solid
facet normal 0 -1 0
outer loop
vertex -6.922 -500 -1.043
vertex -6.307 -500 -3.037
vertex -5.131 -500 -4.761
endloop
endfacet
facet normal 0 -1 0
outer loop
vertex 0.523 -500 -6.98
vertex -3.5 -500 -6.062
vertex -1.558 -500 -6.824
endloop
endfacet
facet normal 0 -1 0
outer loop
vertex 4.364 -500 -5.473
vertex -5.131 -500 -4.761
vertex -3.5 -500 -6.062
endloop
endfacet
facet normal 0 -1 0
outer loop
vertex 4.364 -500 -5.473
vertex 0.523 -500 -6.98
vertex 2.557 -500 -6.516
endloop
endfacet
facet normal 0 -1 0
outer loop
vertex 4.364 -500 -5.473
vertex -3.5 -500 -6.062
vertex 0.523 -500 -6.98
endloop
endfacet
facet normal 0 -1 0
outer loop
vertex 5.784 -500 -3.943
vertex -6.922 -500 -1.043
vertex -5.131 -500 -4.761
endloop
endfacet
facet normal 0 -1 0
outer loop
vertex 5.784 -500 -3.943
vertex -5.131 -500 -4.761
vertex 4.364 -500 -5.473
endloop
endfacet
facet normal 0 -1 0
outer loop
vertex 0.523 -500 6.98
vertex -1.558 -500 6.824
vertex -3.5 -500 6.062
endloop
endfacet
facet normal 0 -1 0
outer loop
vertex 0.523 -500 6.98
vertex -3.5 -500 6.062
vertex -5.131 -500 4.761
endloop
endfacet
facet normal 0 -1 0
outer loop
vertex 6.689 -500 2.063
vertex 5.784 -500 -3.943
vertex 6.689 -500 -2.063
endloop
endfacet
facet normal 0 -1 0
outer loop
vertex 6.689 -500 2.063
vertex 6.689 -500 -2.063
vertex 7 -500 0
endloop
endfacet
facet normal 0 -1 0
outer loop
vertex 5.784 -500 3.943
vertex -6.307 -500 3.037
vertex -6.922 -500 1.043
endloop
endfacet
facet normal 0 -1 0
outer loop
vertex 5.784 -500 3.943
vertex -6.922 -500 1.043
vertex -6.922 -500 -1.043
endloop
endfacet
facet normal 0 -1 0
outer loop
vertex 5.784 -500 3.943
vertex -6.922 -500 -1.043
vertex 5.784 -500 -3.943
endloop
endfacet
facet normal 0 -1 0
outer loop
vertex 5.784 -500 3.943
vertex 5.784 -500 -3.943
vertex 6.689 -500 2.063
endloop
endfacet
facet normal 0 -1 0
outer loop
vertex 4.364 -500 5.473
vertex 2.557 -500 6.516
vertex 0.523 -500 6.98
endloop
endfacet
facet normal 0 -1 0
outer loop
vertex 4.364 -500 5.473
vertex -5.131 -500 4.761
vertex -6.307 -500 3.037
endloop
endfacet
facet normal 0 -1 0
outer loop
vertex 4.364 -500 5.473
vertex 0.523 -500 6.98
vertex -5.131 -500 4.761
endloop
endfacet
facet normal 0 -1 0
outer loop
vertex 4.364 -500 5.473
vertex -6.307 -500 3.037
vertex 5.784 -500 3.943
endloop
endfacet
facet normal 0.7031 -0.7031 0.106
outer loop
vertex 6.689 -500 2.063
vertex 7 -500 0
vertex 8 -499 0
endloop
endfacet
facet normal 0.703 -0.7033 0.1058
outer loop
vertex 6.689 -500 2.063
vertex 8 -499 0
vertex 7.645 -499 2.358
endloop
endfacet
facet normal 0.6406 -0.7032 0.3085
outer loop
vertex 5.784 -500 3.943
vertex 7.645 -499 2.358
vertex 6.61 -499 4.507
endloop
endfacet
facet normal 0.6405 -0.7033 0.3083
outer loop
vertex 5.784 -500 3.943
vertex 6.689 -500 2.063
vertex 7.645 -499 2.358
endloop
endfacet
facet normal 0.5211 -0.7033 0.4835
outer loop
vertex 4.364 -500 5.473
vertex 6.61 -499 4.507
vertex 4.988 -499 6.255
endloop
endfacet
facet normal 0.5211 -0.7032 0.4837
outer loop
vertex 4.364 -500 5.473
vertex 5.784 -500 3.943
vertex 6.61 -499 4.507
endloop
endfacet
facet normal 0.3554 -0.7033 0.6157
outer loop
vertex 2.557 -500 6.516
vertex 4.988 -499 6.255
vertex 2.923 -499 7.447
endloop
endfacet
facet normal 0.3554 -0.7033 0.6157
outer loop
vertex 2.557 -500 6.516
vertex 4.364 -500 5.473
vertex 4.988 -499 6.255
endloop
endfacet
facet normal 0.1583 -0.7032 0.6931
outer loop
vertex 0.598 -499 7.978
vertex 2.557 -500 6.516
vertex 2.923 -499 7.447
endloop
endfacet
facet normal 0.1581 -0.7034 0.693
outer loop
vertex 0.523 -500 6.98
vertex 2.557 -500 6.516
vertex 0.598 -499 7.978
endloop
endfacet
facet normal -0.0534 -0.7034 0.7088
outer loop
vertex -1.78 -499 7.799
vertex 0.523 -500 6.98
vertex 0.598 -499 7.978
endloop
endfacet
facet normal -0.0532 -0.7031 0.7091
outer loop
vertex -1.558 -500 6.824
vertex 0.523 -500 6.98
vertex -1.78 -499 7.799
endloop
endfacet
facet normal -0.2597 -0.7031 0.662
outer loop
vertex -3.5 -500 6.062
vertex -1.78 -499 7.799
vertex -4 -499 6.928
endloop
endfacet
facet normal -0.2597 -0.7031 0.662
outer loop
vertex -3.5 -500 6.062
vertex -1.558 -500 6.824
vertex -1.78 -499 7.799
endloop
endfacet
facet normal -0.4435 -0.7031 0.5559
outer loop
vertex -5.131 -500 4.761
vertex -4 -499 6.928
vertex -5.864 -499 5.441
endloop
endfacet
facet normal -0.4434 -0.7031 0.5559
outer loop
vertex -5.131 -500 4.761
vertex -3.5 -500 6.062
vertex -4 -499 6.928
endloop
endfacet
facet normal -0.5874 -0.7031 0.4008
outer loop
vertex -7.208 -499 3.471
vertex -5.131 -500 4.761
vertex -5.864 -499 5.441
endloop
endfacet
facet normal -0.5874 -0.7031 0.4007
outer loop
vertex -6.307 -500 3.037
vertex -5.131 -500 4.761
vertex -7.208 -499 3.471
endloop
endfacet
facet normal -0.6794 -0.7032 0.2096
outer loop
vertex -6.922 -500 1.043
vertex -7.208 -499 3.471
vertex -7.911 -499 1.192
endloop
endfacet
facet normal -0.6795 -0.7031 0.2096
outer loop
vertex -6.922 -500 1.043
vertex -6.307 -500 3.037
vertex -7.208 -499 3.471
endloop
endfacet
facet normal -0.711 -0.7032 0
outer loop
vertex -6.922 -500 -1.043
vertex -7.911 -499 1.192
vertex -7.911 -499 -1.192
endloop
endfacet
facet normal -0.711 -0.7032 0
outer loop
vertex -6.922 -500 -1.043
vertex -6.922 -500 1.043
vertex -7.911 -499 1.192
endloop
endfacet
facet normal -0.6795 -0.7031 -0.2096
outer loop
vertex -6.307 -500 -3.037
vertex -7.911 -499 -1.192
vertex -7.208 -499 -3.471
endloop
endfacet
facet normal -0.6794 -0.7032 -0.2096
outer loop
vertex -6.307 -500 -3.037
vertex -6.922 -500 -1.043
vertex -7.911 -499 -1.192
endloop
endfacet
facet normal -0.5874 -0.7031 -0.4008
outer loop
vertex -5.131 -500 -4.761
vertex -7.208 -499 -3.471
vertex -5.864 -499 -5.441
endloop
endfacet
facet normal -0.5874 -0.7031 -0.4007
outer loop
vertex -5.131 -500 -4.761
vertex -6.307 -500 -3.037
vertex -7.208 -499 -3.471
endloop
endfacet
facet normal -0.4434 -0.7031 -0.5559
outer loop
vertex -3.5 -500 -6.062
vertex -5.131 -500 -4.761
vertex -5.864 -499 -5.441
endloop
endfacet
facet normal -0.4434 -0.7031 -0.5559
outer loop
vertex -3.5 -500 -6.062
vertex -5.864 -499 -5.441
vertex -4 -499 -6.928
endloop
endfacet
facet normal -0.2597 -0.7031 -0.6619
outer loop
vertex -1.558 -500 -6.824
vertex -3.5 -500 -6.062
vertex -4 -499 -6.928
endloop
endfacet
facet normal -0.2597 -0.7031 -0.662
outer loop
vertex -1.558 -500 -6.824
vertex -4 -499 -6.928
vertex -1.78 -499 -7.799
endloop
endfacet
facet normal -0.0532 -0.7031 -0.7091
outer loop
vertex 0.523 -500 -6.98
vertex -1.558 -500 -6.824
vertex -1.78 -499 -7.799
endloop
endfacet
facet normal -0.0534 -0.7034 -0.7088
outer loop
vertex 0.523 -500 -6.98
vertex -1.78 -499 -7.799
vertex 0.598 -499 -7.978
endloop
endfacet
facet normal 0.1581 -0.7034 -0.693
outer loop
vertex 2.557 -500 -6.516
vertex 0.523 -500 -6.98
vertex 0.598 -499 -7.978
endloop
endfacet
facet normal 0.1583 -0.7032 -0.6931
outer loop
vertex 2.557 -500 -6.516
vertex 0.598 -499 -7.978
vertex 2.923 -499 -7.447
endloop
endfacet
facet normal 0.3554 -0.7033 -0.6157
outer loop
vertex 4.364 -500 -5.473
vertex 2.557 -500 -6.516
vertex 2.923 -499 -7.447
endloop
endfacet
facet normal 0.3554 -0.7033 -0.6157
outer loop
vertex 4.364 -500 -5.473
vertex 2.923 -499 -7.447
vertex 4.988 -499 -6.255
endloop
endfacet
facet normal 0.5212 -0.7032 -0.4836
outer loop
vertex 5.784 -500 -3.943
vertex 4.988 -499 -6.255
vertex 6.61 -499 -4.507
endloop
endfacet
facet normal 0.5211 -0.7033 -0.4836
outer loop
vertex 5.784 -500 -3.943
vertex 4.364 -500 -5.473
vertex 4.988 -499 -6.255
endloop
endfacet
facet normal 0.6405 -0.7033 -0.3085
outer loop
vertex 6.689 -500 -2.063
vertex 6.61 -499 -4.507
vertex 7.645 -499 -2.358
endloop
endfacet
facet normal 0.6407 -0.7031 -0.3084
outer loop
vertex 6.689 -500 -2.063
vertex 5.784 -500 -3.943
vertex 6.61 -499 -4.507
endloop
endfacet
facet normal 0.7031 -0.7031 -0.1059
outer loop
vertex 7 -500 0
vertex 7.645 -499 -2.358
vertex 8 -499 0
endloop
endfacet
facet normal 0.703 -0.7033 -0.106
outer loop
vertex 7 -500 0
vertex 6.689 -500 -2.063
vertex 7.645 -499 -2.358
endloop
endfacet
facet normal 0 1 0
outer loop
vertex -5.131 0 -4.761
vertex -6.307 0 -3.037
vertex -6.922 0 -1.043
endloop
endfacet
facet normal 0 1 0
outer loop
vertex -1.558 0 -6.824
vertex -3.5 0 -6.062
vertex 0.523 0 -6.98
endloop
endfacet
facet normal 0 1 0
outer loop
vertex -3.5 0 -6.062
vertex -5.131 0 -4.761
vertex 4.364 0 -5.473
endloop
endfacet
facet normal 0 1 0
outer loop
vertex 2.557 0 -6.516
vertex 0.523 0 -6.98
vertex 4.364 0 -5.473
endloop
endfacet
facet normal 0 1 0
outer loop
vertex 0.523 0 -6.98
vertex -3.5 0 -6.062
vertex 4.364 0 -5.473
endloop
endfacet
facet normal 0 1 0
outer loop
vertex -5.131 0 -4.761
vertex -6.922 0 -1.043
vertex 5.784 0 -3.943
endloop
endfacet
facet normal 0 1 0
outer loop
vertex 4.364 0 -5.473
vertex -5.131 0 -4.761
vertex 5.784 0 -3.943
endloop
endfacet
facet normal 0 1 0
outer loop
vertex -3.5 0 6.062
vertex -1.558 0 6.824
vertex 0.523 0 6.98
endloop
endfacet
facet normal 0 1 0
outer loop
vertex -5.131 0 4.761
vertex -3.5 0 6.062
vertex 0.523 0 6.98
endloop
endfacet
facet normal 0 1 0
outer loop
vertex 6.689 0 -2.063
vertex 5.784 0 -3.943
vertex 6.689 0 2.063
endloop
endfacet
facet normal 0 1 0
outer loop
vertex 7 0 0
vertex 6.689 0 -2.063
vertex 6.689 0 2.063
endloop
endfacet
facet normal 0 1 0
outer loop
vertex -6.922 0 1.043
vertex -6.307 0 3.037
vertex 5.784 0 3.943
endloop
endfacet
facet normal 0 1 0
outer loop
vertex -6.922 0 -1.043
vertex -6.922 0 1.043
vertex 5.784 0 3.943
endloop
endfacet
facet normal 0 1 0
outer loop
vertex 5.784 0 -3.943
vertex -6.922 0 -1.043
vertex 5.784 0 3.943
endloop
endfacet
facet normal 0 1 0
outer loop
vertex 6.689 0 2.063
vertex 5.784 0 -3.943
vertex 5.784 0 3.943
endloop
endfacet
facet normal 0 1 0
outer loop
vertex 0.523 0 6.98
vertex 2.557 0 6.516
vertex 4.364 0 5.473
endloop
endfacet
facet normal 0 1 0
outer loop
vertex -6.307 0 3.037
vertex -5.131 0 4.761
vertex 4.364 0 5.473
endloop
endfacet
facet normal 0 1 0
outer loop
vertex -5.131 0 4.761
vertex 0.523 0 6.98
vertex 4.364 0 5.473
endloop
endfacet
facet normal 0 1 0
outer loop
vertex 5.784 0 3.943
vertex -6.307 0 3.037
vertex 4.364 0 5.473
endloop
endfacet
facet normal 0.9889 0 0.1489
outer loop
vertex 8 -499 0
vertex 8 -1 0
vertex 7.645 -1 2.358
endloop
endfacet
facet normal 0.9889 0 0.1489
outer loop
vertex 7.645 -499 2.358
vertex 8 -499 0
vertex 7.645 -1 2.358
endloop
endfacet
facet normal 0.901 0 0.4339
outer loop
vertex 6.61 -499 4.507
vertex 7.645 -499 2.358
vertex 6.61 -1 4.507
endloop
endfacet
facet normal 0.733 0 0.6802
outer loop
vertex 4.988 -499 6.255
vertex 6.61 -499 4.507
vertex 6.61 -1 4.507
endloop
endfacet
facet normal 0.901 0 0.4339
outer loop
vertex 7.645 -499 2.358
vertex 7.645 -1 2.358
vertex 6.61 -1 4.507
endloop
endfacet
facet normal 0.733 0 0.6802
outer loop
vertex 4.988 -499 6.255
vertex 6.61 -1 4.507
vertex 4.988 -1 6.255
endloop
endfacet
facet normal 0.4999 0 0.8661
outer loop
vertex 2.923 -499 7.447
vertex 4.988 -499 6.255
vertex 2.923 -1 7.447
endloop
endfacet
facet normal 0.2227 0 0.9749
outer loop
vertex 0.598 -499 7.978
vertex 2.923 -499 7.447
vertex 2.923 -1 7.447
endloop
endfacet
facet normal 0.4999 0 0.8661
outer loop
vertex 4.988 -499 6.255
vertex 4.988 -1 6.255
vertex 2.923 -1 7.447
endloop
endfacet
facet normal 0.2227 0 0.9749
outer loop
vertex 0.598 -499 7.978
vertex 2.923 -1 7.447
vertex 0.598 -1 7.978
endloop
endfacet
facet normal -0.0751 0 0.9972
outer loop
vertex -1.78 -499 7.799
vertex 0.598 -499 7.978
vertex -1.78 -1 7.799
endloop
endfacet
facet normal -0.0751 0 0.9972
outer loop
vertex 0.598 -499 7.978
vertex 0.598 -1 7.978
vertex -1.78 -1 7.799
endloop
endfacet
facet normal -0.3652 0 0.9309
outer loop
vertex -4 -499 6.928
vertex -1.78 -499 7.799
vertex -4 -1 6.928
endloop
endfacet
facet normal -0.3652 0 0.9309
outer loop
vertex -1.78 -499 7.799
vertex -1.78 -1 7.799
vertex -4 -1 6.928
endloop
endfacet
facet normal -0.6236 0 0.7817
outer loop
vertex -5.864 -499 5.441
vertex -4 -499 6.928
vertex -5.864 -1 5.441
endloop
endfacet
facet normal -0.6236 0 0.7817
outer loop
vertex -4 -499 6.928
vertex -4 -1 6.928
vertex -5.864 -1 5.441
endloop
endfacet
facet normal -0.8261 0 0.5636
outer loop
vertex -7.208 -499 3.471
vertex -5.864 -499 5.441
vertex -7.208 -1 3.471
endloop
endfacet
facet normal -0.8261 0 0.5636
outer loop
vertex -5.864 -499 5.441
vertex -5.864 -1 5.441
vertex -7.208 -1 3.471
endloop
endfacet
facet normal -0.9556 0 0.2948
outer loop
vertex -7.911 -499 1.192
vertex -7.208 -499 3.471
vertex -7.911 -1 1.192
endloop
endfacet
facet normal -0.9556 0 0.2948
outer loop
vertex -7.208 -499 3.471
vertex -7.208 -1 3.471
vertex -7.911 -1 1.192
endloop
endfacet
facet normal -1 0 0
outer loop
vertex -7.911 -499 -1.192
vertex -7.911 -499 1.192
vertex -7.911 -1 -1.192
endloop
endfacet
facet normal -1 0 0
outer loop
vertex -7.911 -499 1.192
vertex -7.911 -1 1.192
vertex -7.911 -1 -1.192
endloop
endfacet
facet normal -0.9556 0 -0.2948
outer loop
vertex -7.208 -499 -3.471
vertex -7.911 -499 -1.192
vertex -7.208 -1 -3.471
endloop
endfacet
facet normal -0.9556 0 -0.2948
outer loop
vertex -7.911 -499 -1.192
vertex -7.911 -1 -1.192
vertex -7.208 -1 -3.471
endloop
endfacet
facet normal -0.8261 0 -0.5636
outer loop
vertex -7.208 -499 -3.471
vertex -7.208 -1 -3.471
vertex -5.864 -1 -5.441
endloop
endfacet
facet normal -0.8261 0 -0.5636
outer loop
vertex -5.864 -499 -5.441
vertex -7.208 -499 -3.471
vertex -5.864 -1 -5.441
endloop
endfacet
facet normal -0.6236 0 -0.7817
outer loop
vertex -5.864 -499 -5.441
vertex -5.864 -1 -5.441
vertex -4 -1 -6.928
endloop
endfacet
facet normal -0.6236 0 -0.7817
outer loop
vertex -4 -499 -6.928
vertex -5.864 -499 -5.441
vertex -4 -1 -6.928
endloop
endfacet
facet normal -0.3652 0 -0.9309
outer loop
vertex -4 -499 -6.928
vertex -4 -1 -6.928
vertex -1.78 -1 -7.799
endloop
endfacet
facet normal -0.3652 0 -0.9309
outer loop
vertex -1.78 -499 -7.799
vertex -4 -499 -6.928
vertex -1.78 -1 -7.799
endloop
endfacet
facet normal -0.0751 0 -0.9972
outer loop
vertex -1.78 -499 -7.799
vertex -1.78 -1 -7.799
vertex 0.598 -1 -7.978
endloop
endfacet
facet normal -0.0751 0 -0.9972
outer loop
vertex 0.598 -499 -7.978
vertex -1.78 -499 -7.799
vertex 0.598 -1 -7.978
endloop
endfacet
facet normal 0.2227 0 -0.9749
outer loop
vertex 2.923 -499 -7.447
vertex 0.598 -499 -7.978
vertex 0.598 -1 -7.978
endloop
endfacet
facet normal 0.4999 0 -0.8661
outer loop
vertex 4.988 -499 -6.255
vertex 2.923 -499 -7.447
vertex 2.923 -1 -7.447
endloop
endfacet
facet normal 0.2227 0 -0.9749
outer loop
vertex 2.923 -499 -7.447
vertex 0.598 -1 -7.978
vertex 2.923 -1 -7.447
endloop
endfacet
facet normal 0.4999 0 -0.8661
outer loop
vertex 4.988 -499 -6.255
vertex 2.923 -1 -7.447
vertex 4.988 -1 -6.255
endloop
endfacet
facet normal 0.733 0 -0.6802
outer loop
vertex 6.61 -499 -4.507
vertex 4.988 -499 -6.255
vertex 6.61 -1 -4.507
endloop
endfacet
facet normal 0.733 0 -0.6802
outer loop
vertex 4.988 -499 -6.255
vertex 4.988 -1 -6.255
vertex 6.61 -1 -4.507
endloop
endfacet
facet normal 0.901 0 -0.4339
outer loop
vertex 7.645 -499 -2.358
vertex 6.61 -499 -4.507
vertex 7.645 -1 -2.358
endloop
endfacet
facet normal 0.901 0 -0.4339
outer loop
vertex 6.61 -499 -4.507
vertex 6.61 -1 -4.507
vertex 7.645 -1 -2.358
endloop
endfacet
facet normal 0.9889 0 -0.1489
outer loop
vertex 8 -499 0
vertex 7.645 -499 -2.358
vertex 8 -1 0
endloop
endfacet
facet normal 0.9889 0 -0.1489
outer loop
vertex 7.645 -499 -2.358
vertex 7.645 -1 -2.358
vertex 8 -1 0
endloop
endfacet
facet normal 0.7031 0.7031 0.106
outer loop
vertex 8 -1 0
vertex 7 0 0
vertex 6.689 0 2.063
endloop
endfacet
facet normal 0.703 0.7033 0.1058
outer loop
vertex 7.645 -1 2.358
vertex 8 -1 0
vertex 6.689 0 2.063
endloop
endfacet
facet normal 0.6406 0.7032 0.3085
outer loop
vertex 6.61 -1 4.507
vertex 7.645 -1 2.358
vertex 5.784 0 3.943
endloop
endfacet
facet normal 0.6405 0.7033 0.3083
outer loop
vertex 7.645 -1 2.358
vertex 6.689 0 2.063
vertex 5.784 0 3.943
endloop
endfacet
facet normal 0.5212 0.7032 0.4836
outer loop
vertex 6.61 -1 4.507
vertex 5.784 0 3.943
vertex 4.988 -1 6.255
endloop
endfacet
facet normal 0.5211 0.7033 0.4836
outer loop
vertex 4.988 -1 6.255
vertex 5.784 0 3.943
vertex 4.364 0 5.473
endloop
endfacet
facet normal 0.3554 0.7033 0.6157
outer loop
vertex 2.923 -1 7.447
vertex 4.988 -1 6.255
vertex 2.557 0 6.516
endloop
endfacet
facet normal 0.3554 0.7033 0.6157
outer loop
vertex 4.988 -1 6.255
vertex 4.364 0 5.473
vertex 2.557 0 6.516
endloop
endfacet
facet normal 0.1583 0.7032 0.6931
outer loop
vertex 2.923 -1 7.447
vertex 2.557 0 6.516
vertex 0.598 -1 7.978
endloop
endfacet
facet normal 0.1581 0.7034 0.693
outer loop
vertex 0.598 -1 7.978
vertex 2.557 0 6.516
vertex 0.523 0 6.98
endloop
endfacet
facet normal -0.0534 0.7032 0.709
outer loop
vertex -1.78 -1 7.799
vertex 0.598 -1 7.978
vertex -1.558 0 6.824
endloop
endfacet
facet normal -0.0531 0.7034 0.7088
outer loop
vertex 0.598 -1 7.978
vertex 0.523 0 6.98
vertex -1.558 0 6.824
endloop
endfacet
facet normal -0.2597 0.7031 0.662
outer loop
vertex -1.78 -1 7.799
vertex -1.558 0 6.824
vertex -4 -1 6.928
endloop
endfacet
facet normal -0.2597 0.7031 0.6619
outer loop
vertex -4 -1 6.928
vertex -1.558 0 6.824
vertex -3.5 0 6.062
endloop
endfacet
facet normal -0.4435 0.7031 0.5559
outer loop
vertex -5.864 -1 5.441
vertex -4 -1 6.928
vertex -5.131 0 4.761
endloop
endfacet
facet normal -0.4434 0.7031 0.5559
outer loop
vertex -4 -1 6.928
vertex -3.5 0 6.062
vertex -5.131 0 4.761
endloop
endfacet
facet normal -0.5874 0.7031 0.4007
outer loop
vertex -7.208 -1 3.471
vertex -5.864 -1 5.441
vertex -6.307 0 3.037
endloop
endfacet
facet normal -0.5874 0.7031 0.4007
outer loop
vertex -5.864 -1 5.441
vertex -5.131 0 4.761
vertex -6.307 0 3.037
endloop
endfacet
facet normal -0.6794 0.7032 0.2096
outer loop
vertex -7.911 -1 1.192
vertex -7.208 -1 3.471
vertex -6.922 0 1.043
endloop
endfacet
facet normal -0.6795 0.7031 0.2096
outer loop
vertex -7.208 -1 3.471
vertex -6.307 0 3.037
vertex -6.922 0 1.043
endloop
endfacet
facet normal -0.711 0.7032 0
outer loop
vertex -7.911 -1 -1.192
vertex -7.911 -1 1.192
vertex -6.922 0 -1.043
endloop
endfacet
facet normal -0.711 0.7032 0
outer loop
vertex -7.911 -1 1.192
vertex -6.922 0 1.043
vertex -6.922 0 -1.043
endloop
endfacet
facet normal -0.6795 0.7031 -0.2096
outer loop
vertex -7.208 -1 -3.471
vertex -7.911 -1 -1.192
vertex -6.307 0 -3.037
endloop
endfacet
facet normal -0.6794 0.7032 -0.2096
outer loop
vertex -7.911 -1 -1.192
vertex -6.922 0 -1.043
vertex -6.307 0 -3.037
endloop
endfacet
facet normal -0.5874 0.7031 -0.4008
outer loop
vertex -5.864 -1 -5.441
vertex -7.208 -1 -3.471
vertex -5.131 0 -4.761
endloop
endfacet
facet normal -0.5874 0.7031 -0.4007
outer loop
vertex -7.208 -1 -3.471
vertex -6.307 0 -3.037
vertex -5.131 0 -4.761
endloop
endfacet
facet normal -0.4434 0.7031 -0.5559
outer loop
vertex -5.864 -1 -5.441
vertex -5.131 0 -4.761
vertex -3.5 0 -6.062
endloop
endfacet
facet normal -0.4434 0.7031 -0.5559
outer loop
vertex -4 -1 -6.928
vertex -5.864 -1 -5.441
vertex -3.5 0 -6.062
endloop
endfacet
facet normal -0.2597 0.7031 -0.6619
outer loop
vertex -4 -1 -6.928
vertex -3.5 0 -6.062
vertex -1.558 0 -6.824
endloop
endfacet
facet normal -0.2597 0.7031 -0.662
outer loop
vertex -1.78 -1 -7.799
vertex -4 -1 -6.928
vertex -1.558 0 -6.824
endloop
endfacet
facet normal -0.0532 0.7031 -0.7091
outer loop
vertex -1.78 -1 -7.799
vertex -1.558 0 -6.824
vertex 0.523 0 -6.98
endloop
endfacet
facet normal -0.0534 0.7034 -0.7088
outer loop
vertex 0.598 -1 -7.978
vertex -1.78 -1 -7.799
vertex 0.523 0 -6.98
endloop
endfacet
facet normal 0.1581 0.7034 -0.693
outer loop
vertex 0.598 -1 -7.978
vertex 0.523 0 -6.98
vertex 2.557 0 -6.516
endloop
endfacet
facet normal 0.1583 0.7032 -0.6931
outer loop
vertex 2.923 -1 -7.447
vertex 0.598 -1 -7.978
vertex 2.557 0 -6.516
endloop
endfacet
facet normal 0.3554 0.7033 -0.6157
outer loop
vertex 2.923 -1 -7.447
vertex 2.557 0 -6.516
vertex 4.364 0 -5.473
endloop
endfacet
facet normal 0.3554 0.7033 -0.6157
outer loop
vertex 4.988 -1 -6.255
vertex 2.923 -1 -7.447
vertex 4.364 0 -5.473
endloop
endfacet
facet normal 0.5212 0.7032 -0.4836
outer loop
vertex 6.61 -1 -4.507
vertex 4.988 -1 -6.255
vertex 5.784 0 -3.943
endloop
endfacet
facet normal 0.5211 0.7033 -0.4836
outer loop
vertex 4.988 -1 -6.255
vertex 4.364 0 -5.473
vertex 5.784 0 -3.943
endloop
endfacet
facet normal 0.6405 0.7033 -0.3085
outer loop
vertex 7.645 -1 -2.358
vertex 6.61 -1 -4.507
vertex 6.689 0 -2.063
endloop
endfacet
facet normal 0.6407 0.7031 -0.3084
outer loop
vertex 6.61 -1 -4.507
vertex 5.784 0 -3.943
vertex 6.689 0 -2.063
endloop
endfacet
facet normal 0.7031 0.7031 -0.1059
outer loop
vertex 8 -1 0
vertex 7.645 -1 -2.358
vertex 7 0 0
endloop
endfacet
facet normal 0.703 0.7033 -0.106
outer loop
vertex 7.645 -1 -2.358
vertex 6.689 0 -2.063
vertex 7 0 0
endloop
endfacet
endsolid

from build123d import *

# Parameters (mm, degrees)
SKETCH_R        = 8
PAD_DEPTH       = 500
CHAMFER_SIZE    = 1
CHAMFER001_SIZE = 1


with BuildPart() as part:
    # Sketch → Pad (new body)
    with BuildSketch(Plane.XZ):
        Circle(SKETCH_R)
    extrude(amount=PAD_DEPTH)

    # Chamfer
    chamfer_edges = [part.edges().sort_by_distance(p)[0] for p in [
        (-8, -500, 0),
    ]]
    chamfer(chamfer_edges, length=CHAMFER_SIZE)

    # Chamfer001
    chamfer001_edges = [part.edges().sort_by_distance(p)[0] for p in [
        (-8, 0, 0),
    ]]
    chamfer(chamfer001_edges, length=CHAMFER001_SIZE)


solid = part.part
